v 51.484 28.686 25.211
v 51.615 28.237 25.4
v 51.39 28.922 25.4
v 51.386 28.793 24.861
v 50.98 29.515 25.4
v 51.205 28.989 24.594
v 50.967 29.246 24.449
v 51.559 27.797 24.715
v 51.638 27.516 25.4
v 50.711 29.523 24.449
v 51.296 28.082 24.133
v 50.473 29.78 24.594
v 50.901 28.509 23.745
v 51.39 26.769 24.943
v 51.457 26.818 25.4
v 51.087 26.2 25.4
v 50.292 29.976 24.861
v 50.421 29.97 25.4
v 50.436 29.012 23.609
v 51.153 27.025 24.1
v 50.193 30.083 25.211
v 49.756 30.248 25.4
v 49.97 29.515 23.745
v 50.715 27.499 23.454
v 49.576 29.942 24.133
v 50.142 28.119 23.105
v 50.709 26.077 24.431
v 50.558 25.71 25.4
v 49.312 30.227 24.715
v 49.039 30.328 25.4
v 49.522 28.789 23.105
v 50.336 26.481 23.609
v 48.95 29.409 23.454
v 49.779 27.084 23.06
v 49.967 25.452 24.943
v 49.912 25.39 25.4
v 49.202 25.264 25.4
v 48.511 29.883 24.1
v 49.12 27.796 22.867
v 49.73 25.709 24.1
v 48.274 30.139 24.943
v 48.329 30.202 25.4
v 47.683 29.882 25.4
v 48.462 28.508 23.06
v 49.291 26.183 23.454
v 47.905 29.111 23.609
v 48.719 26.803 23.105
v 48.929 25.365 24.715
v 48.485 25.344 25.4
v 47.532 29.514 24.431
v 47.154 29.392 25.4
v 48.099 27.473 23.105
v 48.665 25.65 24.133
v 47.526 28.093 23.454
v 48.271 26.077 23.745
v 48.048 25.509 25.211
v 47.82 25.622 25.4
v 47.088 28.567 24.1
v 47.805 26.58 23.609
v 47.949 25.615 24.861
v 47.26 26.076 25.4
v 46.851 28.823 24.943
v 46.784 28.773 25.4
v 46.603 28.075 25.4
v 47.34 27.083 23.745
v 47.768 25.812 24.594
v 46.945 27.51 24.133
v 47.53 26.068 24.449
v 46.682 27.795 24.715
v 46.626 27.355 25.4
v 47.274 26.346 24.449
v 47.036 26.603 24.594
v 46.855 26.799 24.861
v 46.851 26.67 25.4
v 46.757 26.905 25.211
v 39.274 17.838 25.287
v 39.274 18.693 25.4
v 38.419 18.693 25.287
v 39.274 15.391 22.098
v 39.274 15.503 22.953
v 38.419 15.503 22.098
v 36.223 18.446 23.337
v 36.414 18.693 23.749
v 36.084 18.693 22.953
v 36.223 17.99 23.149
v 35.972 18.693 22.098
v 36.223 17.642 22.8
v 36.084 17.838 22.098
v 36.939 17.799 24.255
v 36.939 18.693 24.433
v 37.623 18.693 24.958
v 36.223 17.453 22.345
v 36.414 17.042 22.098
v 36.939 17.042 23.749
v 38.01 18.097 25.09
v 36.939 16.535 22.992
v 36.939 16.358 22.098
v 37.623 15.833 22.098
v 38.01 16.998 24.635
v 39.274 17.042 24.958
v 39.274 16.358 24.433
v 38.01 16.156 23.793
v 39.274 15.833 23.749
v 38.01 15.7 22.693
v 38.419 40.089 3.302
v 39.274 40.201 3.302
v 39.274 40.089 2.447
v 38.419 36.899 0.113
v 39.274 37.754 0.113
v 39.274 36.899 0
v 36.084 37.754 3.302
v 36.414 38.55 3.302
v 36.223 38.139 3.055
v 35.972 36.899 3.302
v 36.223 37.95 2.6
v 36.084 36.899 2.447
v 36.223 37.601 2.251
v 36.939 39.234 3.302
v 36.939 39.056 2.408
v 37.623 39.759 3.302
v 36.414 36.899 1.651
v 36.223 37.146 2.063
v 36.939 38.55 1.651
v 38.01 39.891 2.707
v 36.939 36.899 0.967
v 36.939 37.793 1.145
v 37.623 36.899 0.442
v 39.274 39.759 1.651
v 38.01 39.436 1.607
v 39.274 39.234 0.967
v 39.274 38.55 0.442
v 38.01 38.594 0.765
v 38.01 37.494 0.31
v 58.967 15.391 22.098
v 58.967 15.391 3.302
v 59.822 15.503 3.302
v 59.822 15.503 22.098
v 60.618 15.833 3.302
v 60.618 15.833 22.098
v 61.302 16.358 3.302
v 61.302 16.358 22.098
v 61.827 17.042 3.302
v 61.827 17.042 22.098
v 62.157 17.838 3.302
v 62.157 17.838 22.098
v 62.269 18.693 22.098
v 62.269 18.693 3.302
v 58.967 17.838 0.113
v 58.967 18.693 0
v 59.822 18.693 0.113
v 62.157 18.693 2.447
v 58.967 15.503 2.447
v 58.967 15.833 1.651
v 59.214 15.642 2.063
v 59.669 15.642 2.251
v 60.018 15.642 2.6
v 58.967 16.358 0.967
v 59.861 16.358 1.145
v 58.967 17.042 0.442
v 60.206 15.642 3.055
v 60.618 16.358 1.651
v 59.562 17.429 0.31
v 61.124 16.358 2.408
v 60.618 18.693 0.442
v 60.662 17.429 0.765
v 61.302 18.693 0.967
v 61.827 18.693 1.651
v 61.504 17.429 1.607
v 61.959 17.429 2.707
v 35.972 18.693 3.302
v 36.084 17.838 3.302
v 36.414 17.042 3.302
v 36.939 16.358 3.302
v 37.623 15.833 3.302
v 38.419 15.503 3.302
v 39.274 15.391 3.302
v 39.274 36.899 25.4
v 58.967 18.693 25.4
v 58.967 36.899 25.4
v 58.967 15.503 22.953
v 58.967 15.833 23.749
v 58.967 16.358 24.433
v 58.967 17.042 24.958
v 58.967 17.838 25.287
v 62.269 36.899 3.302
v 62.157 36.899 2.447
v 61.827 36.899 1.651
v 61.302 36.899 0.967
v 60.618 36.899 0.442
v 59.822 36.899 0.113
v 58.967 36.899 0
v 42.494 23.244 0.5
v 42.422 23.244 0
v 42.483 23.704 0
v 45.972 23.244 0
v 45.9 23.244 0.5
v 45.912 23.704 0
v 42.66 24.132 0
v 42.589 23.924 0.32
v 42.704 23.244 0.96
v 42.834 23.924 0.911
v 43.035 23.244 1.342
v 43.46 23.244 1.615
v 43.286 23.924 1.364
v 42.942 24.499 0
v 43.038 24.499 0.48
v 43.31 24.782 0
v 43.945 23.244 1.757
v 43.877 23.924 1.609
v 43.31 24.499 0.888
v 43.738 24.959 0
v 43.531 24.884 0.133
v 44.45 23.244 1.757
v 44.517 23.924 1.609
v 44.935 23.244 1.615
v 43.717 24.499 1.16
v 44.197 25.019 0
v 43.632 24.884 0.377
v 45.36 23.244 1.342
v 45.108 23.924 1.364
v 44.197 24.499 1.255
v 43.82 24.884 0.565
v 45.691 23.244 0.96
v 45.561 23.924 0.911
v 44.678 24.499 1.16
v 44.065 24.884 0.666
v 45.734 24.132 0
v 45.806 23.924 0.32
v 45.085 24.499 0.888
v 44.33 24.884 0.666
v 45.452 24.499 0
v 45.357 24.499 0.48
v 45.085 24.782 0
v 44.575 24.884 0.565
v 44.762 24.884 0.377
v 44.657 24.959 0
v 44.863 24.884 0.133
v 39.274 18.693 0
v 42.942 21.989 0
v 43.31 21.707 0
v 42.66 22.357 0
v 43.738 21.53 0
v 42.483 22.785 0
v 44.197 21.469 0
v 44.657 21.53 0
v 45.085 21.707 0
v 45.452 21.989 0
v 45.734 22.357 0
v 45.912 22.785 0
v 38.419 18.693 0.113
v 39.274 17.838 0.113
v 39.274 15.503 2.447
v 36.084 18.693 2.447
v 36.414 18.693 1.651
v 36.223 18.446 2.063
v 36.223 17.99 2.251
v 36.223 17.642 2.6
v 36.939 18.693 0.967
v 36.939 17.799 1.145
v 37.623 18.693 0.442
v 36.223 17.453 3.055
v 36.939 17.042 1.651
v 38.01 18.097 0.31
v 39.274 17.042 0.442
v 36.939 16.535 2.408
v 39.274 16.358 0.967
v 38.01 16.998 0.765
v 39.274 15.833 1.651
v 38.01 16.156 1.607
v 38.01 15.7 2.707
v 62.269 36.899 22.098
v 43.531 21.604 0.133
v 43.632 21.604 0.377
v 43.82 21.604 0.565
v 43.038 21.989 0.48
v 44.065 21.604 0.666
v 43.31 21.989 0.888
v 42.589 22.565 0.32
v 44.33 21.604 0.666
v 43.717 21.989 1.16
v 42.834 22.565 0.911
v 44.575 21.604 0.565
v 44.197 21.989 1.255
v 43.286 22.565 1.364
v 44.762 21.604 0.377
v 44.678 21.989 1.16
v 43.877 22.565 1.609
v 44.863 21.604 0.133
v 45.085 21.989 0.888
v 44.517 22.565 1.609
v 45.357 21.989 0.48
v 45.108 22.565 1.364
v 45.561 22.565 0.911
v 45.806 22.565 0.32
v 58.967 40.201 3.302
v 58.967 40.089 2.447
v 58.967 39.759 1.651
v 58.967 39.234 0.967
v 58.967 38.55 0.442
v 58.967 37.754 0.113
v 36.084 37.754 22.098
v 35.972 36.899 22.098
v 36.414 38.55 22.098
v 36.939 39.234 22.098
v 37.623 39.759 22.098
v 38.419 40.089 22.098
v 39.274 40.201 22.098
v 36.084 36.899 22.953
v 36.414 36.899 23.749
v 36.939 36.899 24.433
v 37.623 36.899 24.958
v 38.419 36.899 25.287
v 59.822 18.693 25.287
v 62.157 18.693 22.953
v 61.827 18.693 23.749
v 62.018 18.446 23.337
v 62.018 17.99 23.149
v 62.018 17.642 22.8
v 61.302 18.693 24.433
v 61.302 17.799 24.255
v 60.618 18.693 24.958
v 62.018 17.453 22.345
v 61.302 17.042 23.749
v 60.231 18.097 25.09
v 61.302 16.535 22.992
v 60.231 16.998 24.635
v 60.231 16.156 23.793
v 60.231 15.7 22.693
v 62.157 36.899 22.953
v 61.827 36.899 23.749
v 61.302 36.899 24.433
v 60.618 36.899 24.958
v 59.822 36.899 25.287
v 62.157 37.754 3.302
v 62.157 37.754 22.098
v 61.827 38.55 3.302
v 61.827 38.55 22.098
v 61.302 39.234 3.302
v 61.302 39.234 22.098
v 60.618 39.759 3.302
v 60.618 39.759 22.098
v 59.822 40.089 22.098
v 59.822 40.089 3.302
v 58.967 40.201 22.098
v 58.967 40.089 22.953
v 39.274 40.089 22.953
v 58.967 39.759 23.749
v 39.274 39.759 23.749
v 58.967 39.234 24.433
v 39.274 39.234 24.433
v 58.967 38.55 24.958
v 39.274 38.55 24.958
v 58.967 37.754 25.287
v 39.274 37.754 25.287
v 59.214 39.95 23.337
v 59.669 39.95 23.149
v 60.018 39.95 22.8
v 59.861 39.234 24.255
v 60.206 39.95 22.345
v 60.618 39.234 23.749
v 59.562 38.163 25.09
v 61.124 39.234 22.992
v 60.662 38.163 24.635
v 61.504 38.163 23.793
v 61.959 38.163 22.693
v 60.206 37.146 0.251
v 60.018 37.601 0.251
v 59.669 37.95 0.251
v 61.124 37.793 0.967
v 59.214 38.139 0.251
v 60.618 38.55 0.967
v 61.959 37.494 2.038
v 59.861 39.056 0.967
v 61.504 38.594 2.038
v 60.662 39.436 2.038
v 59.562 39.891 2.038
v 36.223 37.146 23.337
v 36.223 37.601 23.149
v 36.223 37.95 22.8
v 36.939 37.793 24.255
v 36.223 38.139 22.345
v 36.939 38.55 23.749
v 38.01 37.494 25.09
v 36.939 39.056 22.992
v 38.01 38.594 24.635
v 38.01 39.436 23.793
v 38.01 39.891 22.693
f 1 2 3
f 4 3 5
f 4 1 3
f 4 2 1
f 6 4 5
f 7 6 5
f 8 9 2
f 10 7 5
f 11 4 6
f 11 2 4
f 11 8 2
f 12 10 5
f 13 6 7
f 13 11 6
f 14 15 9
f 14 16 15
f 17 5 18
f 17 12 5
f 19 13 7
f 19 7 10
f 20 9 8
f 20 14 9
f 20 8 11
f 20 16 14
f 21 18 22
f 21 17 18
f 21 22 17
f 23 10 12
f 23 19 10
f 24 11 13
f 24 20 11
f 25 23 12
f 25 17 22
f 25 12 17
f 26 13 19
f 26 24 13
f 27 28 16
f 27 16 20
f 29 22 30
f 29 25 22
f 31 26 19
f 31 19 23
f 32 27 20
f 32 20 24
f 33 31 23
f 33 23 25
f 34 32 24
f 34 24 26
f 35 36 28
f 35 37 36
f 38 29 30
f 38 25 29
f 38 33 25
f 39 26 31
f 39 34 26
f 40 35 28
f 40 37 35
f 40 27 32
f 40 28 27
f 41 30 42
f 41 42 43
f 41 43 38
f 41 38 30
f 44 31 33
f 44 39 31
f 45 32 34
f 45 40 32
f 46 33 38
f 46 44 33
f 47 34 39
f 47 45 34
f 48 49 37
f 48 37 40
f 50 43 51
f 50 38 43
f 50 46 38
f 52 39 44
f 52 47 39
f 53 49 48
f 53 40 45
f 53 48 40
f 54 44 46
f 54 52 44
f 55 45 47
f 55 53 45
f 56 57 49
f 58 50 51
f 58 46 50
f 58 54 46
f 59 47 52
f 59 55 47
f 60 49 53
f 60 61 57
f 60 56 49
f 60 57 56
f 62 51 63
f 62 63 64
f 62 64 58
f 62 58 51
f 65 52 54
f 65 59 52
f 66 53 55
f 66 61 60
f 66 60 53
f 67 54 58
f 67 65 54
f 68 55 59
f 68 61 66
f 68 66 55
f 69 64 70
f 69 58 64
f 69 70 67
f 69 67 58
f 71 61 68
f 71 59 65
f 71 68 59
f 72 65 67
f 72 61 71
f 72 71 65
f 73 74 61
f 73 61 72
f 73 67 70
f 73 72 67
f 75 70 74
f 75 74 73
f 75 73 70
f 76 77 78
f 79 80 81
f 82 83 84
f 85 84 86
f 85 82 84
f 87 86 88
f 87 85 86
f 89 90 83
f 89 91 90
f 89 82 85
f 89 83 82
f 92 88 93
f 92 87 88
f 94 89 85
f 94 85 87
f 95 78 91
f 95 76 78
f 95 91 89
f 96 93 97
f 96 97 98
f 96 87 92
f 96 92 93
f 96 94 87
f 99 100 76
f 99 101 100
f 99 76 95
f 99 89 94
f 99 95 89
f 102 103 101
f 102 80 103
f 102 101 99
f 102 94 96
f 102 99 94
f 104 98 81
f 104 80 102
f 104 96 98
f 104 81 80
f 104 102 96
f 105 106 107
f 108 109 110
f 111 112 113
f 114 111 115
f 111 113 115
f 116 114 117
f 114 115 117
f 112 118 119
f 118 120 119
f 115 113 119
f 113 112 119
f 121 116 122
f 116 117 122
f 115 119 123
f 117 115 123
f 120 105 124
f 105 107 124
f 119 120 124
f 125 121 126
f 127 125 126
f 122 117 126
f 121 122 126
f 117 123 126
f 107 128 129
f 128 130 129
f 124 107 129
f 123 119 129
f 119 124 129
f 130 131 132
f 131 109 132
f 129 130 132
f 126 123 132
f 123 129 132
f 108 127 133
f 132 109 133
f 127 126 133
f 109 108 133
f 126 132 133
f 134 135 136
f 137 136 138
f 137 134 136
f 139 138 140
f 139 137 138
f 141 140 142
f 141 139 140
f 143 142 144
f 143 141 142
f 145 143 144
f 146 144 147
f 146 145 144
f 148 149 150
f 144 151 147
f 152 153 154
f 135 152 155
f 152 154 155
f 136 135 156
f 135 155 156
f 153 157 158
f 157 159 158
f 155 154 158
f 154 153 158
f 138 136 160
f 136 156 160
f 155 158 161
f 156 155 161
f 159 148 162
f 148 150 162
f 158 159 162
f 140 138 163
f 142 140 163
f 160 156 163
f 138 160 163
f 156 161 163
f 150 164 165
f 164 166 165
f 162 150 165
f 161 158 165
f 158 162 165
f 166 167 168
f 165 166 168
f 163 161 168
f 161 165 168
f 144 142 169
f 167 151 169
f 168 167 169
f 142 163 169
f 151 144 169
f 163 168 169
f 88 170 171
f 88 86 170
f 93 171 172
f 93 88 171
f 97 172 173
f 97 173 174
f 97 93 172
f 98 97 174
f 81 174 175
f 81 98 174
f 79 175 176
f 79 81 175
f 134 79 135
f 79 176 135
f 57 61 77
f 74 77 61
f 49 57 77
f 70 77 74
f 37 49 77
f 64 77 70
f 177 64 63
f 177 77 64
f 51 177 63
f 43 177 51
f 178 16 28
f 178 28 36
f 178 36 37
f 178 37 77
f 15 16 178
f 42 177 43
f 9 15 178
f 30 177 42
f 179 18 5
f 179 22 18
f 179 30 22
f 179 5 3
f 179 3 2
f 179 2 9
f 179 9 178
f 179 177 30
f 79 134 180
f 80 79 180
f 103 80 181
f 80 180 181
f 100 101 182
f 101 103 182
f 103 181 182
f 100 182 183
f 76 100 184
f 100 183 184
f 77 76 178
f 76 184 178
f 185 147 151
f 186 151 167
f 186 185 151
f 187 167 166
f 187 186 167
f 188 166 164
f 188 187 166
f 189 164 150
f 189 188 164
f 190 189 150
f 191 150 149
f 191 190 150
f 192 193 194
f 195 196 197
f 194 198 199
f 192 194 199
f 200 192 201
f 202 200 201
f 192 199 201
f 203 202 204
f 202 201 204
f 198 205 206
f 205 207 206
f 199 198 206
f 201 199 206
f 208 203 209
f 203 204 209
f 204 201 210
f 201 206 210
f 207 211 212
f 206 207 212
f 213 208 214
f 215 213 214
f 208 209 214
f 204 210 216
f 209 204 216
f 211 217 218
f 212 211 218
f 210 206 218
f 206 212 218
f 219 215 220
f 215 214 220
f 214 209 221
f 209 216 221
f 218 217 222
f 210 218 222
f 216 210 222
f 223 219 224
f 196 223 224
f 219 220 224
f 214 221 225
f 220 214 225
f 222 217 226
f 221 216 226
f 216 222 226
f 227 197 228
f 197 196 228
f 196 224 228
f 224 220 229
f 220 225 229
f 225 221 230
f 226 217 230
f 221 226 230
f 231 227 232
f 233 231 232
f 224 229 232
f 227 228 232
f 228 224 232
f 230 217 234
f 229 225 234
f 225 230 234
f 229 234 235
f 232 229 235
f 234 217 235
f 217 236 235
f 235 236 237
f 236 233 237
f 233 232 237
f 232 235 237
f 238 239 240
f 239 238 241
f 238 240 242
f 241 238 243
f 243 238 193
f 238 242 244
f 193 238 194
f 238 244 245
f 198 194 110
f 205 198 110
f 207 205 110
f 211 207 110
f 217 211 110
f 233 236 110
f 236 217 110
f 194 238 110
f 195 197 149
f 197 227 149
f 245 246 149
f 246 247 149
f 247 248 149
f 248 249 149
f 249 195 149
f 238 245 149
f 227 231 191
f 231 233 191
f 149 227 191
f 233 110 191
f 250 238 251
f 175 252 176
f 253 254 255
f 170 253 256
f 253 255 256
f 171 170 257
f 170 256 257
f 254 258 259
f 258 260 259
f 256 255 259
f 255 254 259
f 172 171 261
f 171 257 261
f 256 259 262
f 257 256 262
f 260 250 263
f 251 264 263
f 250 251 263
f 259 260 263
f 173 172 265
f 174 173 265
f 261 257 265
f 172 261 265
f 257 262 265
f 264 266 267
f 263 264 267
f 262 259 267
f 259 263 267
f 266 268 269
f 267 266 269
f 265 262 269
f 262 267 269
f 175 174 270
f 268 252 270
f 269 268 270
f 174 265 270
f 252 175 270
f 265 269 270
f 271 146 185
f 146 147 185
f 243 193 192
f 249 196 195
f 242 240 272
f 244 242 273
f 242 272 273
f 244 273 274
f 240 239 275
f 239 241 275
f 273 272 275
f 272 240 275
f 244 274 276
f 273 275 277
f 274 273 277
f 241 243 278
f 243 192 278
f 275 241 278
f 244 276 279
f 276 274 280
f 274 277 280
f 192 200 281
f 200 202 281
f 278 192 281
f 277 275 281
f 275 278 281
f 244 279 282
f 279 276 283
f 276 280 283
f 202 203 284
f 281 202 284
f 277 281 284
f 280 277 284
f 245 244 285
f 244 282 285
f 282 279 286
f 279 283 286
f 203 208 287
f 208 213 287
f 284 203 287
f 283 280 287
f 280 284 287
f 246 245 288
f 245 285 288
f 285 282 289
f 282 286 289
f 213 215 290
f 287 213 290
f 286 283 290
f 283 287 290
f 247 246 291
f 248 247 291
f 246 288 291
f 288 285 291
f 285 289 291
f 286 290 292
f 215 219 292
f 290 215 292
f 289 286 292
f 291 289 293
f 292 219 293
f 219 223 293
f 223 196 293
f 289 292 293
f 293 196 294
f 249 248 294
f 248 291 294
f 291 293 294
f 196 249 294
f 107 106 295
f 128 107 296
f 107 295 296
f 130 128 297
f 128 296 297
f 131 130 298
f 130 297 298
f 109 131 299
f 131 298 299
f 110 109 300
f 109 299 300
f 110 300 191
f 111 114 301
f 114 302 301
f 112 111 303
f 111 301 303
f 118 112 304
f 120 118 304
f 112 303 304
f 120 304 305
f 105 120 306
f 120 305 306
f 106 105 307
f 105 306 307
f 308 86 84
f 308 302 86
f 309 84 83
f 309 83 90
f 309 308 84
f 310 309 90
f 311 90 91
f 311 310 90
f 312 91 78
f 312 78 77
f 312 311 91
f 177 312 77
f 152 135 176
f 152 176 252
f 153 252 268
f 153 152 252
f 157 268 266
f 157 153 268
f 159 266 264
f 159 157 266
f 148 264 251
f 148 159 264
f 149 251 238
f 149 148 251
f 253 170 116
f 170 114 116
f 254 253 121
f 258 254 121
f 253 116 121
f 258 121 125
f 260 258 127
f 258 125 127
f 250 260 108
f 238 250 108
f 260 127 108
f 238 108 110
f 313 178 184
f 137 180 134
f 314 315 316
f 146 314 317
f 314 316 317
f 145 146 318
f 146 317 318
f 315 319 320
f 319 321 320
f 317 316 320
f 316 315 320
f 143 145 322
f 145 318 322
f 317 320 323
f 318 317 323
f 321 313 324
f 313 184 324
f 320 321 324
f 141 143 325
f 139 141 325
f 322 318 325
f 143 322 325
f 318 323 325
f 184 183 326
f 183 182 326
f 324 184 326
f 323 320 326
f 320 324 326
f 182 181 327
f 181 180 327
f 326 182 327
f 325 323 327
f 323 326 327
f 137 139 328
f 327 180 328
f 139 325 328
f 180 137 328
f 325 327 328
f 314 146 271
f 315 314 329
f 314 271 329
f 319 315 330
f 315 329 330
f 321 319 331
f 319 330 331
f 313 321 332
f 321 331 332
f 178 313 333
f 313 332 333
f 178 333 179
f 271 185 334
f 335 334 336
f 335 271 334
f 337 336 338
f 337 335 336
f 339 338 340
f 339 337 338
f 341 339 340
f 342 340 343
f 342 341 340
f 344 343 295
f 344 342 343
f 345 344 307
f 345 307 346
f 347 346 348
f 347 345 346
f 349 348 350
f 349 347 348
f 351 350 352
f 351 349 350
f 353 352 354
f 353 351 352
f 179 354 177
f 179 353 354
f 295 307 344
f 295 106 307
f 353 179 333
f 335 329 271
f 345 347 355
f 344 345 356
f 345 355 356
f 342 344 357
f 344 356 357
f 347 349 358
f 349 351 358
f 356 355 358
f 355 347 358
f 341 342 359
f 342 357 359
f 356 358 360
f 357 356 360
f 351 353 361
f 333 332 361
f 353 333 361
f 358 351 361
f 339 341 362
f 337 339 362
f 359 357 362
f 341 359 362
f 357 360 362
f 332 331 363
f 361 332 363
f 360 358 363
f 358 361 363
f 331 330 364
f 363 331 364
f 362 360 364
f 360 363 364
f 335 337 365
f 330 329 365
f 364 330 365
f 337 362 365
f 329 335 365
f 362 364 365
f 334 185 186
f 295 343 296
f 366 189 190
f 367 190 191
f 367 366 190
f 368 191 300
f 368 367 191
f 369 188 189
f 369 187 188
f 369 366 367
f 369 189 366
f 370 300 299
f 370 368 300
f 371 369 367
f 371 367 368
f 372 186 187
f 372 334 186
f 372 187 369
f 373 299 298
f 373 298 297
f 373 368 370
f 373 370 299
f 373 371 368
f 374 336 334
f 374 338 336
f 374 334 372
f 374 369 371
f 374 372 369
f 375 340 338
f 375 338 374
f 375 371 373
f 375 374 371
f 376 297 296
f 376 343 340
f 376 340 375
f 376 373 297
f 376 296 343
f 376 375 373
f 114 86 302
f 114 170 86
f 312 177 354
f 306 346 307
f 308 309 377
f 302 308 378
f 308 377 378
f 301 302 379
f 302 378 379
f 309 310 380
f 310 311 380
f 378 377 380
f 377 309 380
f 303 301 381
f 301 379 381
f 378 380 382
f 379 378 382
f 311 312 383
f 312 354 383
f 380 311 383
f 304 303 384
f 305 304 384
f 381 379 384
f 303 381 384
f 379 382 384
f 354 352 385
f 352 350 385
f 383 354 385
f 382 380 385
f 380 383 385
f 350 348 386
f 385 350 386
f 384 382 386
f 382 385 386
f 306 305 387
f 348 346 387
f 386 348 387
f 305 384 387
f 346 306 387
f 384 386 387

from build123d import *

# Parameters (mm, degrees)
F0_W          = 26.2972526252
F0_H          = 24.8107817024
F1_DEPTH      = 25.4
F2_R          = 3.302
F4_ANGLE_BACK = 180
F4_ANGLE      = 180


with BuildPart() as f1:
    # F0 (on Top) → F1 (new body)
    with BuildSketch(Plane.XY):
        with Locations((49.1204950958, 27.7958931401)):
            Rectangle(F0_W, F0_H)
    extrude(amount=F1_DEPTH)

    # F2
    f2_edges = [f1.edges().sort_by_distance(p)[0] for p in [
        (49.120495, 15.390502, 25.4),
        (62.269121, 27.795893, 25.4),
        (49.120495, 40.201284, 25.4),
        (35.971869, 27.795893, 25.4),
        (62.269121, 40.201284, 12.7),
        (62.269121, 27.795893, 0),
        (49.120495, 40.201284, 0),
        (35.971869, 40.201284, 12.7),
        (49.120495, 15.390502, 0),
        (35.971869, 27.795893, 0),
        (35.971869, 15.390502, 12.7),
        (62.269121, 15.390502, 12.7),
    ]]
    fillet(f2_edges, radius=F2_R)

    # F3 (on face) → F4 (revolve, cut)
    with BuildSketch(Plane.XY.offset(25.4), mode=Mode.PRIVATE) as f4_sk:
        with BuildLine():
            ThreePointArc((50.9804914392, 29.5154946725), (47.4008935635, 29.6558894835), (47.2604987525, 26.0762916078))
            Line((47.2604987525, 26.0762916078), (50.9804914392, 29.5154946725))
        make_face()
    revolve(f4_sk.sketch.rotate(Axis((49.1204950958, 27.7958931401, 25.4), (0.7342755569, 0.678851535, 0)), -F4_ANGLE_BACK), axis=Axis((49.1204950958, 27.7958931401, 25.4), (0.7342755569, 0.678851535, 0)), revolution_arc=F4_ANGLE, mode=Mode.SUBTRACT)

    # F5 (on face) → F6 (revolve, cut)
    with BuildSketch(Plane(origin=(0, 0, 0), x_dir=(1, 0, 0), z_dir=(0, 0, -1))):
        with BuildLine():
            Line((44.1971819395, -23.2441977145), (42.4220417874, -23.2441977145))
            ThreePointArc((42.4220417874, -23.2441977145), (42.9419683004, -24.4994113537), (44.1971819395, -25.0193378667))
            Line((44.1971819395, -25.0193378667), (44.1971819395, -23.2441977145))
        make_face()
        with BuildLine():
            Line((44.1971819395, -23.2441977145), (44.1971819395, -21.4690575624))
            ThreePointArc((44.1971819395, -21.4690575624), (42.9419683004, -21.9889840754), (42.4220417874, -23.2441977145))
            Line((42.4220417874, -23.2441977145), (44.1971819395, -23.2441977145))
        make_face()
    revolve(axis=Axis((44.1971819395, 23.2441977145, 0), (0, 1, 0)), mode=Mode.SUBTRACT)


solid = f1.part
